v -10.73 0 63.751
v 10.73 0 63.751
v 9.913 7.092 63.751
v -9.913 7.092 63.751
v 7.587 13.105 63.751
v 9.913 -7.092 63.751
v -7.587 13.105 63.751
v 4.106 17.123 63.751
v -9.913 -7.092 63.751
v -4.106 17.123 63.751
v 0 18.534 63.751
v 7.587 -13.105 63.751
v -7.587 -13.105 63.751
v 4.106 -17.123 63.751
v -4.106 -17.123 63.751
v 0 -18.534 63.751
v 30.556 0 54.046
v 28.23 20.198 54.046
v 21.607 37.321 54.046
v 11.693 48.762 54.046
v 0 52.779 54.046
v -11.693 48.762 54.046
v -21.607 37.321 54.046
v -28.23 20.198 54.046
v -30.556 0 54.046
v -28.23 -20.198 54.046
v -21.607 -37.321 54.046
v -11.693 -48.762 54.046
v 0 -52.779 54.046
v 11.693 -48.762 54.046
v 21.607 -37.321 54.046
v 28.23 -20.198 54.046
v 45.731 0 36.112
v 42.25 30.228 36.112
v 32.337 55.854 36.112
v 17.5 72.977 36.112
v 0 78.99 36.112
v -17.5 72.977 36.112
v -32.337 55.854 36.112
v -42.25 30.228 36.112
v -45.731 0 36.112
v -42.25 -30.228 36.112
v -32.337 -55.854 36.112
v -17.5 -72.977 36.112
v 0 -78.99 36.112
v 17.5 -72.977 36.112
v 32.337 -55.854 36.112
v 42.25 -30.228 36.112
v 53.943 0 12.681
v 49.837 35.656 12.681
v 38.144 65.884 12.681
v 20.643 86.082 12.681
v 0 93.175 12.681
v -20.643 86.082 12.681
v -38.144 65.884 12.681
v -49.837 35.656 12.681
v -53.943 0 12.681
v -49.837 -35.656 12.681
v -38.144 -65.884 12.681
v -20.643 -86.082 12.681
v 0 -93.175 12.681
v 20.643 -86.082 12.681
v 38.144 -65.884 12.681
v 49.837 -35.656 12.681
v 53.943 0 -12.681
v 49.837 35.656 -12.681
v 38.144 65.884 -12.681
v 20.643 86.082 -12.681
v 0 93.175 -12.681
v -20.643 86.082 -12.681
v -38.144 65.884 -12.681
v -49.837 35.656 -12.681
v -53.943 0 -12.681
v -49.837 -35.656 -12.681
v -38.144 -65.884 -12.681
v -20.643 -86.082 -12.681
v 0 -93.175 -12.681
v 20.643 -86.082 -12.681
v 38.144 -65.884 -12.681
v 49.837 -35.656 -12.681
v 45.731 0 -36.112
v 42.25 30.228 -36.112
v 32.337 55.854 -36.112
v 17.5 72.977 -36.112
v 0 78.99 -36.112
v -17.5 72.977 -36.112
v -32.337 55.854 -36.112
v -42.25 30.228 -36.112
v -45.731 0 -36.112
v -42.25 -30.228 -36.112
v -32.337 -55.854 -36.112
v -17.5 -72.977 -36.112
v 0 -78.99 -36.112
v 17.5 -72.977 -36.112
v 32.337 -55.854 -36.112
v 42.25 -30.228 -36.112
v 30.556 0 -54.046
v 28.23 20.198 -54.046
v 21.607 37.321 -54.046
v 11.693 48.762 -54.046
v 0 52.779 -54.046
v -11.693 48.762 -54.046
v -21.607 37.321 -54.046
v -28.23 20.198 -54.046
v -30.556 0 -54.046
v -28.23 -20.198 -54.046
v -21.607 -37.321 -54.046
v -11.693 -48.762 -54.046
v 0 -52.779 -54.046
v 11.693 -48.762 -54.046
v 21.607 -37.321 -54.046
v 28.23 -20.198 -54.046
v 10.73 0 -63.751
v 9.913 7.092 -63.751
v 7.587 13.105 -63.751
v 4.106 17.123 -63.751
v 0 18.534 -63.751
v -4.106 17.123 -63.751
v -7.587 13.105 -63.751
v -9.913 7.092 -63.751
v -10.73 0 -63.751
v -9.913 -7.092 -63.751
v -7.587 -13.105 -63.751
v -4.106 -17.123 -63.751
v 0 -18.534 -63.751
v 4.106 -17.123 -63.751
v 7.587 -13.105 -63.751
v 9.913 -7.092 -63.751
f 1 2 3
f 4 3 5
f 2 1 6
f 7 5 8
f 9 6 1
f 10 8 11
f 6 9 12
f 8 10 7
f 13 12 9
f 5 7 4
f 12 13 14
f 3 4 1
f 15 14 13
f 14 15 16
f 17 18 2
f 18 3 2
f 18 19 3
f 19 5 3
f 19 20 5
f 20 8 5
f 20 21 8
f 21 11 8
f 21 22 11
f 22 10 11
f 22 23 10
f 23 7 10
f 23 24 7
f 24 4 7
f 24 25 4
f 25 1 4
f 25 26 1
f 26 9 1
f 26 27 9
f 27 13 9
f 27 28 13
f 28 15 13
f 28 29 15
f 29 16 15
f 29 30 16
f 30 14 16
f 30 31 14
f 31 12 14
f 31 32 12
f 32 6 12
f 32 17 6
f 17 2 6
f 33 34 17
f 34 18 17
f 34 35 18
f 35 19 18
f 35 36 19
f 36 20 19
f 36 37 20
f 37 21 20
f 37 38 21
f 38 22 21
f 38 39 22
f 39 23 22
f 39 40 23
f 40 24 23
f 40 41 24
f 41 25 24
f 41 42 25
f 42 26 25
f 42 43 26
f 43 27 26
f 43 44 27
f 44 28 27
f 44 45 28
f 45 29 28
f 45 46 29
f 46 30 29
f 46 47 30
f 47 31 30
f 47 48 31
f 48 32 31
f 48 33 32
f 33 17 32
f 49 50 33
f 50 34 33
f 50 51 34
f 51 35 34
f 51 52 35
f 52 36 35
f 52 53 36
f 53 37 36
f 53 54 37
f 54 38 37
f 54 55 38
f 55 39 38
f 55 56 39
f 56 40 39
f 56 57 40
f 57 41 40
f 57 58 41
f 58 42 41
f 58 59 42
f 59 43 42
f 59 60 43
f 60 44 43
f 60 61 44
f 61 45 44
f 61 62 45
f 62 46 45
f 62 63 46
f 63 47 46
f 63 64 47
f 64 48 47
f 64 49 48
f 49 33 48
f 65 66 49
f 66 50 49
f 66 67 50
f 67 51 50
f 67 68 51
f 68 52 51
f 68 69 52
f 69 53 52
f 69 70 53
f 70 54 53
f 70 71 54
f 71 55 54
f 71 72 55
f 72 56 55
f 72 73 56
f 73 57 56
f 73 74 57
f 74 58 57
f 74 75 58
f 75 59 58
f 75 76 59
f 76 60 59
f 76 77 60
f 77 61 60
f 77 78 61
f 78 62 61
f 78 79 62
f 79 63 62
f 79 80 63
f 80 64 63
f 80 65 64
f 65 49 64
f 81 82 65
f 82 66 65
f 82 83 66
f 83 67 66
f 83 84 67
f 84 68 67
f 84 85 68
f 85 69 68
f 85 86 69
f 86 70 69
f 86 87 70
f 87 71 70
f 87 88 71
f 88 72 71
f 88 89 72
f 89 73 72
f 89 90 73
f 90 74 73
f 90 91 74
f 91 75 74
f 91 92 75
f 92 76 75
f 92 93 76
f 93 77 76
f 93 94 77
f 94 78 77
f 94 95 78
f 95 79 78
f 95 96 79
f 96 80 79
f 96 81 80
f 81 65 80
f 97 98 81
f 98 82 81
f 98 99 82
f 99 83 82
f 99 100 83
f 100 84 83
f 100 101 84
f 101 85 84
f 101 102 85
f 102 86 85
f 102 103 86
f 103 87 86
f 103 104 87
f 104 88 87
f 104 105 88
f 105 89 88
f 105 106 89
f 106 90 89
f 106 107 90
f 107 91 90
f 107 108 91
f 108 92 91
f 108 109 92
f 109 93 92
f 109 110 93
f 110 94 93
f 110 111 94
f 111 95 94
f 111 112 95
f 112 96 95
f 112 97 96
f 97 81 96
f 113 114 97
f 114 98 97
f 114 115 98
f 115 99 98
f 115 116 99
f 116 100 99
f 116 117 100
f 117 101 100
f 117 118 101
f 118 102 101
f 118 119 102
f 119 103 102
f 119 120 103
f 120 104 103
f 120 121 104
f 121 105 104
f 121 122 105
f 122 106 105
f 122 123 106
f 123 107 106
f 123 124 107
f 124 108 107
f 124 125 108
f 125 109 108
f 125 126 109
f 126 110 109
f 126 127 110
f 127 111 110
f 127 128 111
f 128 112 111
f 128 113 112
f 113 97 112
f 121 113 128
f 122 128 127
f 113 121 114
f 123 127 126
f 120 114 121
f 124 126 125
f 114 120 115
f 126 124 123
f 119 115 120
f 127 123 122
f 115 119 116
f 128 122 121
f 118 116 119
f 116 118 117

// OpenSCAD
// Generated by SolidPython 1.0.1 on 2020-07-29 00:46:50


scale(v = [11, 19, 13]) {
	sphere(r = 5);
}
/***********************************************
*********      SolidPython code:      **********
************************************************
 
# import packages: SolidPython
from solid import *
from solid.utils import *
from itertools import chain, combinations, permutations


class Resize:

    def __init__(self, scad_file):
        self.scad_file = scad_file
        #self.scad_file = import_scad(scad_file)
        # cone/cylinder param:
        self.r1 = 0
        self.r2 = 0
        self.h = 0
        # rectangular prism param:
        self.w = 0
        self.l = 0
        # ellipse param:
        self.r = 0

    # import OpenScad code (file name corresponds to shape)


    # classify shape + parameters
    def assign(self, param1, param2, param3):
        if self.scad_file == 'cone.scad':
            self.r1 = param1
            self.r2 = param2
            self.h = param3
        elif self.scad_file == 'cylinder.scad':
            self.r1 = param1
            self.r2 = param2
            self.h = param3
        elif self.scad_file == 'rectangularPrism.scad':
            self.h = param1
            self.l = param2
            self.w = param3
        else:
            self.r = param1
            self.h = param2

    # resize parameters
    def iterate(self):
        x = range(3, 20, 2)
        i = 1
        if self.scad_file == 'cone.scad':
            tempList = list(permutations(x, 2))
            for temp in tempList:
                param1 = temp[0]
                param2 = temp[1]
                filepath = 'produced_scad_files/' + 'cone' + str(param1) + '_' + str(param2) + '_' + '.scad'
                scad_render_to_file(cylinder(h=param1, r1=param2, r2=0), filepath)

        elif self.scad_file == 'cylinder.scad':
            tempList = list(permutations(x, 3))
            for temp in tempList:
                param1 = temp[0]
                param2 = temp[1]
                filepath = 'produced_scad_files/' + 'cylinder' + str(param1) + '_' + str(param2) + '_' + '.scad'
                scad_render_to_file(cylinder(h=param1, r1=param2, r2=param2), filepath)

        elif self.scad_file == 'rectangularPrism.scad':
            tempList = list(permutations(x, 3))
            for temp in tempList:
                param1 = temp[0]
                param2 = temp[1]
                param3 = temp[2]
                filepath = 'produced_scad_files/' + 'rectangularPrism' + str(param1) + '_' + str(param2) + '_' + str(
                    param3) + '.scad'
                scad_render_to_file(cube(size=(param1, param2, param3)), filepath)

        elif self.scad_file == 'ellipse.scad':
            tempList = list(permutations(x, 4))
            for temp in tempList:
                param1 = temp[0]
                param2 = temp[1]
                param3 = temp[2]
                param4 = temp[3]
                filepath = 'produced_scad_files/' + 'ellipse' + str(param1) + '_' + str(param2) + '_' + str(param3) + '_' + str(param4) + '.scad'
                scad_render_to_file(scale([param1, param2, param3])(sphere(r=param4)), filepath)

    def render_to_scadfile(self):
        scad_render_to_file(scad, 'example.scad') 
 
************************************************/
